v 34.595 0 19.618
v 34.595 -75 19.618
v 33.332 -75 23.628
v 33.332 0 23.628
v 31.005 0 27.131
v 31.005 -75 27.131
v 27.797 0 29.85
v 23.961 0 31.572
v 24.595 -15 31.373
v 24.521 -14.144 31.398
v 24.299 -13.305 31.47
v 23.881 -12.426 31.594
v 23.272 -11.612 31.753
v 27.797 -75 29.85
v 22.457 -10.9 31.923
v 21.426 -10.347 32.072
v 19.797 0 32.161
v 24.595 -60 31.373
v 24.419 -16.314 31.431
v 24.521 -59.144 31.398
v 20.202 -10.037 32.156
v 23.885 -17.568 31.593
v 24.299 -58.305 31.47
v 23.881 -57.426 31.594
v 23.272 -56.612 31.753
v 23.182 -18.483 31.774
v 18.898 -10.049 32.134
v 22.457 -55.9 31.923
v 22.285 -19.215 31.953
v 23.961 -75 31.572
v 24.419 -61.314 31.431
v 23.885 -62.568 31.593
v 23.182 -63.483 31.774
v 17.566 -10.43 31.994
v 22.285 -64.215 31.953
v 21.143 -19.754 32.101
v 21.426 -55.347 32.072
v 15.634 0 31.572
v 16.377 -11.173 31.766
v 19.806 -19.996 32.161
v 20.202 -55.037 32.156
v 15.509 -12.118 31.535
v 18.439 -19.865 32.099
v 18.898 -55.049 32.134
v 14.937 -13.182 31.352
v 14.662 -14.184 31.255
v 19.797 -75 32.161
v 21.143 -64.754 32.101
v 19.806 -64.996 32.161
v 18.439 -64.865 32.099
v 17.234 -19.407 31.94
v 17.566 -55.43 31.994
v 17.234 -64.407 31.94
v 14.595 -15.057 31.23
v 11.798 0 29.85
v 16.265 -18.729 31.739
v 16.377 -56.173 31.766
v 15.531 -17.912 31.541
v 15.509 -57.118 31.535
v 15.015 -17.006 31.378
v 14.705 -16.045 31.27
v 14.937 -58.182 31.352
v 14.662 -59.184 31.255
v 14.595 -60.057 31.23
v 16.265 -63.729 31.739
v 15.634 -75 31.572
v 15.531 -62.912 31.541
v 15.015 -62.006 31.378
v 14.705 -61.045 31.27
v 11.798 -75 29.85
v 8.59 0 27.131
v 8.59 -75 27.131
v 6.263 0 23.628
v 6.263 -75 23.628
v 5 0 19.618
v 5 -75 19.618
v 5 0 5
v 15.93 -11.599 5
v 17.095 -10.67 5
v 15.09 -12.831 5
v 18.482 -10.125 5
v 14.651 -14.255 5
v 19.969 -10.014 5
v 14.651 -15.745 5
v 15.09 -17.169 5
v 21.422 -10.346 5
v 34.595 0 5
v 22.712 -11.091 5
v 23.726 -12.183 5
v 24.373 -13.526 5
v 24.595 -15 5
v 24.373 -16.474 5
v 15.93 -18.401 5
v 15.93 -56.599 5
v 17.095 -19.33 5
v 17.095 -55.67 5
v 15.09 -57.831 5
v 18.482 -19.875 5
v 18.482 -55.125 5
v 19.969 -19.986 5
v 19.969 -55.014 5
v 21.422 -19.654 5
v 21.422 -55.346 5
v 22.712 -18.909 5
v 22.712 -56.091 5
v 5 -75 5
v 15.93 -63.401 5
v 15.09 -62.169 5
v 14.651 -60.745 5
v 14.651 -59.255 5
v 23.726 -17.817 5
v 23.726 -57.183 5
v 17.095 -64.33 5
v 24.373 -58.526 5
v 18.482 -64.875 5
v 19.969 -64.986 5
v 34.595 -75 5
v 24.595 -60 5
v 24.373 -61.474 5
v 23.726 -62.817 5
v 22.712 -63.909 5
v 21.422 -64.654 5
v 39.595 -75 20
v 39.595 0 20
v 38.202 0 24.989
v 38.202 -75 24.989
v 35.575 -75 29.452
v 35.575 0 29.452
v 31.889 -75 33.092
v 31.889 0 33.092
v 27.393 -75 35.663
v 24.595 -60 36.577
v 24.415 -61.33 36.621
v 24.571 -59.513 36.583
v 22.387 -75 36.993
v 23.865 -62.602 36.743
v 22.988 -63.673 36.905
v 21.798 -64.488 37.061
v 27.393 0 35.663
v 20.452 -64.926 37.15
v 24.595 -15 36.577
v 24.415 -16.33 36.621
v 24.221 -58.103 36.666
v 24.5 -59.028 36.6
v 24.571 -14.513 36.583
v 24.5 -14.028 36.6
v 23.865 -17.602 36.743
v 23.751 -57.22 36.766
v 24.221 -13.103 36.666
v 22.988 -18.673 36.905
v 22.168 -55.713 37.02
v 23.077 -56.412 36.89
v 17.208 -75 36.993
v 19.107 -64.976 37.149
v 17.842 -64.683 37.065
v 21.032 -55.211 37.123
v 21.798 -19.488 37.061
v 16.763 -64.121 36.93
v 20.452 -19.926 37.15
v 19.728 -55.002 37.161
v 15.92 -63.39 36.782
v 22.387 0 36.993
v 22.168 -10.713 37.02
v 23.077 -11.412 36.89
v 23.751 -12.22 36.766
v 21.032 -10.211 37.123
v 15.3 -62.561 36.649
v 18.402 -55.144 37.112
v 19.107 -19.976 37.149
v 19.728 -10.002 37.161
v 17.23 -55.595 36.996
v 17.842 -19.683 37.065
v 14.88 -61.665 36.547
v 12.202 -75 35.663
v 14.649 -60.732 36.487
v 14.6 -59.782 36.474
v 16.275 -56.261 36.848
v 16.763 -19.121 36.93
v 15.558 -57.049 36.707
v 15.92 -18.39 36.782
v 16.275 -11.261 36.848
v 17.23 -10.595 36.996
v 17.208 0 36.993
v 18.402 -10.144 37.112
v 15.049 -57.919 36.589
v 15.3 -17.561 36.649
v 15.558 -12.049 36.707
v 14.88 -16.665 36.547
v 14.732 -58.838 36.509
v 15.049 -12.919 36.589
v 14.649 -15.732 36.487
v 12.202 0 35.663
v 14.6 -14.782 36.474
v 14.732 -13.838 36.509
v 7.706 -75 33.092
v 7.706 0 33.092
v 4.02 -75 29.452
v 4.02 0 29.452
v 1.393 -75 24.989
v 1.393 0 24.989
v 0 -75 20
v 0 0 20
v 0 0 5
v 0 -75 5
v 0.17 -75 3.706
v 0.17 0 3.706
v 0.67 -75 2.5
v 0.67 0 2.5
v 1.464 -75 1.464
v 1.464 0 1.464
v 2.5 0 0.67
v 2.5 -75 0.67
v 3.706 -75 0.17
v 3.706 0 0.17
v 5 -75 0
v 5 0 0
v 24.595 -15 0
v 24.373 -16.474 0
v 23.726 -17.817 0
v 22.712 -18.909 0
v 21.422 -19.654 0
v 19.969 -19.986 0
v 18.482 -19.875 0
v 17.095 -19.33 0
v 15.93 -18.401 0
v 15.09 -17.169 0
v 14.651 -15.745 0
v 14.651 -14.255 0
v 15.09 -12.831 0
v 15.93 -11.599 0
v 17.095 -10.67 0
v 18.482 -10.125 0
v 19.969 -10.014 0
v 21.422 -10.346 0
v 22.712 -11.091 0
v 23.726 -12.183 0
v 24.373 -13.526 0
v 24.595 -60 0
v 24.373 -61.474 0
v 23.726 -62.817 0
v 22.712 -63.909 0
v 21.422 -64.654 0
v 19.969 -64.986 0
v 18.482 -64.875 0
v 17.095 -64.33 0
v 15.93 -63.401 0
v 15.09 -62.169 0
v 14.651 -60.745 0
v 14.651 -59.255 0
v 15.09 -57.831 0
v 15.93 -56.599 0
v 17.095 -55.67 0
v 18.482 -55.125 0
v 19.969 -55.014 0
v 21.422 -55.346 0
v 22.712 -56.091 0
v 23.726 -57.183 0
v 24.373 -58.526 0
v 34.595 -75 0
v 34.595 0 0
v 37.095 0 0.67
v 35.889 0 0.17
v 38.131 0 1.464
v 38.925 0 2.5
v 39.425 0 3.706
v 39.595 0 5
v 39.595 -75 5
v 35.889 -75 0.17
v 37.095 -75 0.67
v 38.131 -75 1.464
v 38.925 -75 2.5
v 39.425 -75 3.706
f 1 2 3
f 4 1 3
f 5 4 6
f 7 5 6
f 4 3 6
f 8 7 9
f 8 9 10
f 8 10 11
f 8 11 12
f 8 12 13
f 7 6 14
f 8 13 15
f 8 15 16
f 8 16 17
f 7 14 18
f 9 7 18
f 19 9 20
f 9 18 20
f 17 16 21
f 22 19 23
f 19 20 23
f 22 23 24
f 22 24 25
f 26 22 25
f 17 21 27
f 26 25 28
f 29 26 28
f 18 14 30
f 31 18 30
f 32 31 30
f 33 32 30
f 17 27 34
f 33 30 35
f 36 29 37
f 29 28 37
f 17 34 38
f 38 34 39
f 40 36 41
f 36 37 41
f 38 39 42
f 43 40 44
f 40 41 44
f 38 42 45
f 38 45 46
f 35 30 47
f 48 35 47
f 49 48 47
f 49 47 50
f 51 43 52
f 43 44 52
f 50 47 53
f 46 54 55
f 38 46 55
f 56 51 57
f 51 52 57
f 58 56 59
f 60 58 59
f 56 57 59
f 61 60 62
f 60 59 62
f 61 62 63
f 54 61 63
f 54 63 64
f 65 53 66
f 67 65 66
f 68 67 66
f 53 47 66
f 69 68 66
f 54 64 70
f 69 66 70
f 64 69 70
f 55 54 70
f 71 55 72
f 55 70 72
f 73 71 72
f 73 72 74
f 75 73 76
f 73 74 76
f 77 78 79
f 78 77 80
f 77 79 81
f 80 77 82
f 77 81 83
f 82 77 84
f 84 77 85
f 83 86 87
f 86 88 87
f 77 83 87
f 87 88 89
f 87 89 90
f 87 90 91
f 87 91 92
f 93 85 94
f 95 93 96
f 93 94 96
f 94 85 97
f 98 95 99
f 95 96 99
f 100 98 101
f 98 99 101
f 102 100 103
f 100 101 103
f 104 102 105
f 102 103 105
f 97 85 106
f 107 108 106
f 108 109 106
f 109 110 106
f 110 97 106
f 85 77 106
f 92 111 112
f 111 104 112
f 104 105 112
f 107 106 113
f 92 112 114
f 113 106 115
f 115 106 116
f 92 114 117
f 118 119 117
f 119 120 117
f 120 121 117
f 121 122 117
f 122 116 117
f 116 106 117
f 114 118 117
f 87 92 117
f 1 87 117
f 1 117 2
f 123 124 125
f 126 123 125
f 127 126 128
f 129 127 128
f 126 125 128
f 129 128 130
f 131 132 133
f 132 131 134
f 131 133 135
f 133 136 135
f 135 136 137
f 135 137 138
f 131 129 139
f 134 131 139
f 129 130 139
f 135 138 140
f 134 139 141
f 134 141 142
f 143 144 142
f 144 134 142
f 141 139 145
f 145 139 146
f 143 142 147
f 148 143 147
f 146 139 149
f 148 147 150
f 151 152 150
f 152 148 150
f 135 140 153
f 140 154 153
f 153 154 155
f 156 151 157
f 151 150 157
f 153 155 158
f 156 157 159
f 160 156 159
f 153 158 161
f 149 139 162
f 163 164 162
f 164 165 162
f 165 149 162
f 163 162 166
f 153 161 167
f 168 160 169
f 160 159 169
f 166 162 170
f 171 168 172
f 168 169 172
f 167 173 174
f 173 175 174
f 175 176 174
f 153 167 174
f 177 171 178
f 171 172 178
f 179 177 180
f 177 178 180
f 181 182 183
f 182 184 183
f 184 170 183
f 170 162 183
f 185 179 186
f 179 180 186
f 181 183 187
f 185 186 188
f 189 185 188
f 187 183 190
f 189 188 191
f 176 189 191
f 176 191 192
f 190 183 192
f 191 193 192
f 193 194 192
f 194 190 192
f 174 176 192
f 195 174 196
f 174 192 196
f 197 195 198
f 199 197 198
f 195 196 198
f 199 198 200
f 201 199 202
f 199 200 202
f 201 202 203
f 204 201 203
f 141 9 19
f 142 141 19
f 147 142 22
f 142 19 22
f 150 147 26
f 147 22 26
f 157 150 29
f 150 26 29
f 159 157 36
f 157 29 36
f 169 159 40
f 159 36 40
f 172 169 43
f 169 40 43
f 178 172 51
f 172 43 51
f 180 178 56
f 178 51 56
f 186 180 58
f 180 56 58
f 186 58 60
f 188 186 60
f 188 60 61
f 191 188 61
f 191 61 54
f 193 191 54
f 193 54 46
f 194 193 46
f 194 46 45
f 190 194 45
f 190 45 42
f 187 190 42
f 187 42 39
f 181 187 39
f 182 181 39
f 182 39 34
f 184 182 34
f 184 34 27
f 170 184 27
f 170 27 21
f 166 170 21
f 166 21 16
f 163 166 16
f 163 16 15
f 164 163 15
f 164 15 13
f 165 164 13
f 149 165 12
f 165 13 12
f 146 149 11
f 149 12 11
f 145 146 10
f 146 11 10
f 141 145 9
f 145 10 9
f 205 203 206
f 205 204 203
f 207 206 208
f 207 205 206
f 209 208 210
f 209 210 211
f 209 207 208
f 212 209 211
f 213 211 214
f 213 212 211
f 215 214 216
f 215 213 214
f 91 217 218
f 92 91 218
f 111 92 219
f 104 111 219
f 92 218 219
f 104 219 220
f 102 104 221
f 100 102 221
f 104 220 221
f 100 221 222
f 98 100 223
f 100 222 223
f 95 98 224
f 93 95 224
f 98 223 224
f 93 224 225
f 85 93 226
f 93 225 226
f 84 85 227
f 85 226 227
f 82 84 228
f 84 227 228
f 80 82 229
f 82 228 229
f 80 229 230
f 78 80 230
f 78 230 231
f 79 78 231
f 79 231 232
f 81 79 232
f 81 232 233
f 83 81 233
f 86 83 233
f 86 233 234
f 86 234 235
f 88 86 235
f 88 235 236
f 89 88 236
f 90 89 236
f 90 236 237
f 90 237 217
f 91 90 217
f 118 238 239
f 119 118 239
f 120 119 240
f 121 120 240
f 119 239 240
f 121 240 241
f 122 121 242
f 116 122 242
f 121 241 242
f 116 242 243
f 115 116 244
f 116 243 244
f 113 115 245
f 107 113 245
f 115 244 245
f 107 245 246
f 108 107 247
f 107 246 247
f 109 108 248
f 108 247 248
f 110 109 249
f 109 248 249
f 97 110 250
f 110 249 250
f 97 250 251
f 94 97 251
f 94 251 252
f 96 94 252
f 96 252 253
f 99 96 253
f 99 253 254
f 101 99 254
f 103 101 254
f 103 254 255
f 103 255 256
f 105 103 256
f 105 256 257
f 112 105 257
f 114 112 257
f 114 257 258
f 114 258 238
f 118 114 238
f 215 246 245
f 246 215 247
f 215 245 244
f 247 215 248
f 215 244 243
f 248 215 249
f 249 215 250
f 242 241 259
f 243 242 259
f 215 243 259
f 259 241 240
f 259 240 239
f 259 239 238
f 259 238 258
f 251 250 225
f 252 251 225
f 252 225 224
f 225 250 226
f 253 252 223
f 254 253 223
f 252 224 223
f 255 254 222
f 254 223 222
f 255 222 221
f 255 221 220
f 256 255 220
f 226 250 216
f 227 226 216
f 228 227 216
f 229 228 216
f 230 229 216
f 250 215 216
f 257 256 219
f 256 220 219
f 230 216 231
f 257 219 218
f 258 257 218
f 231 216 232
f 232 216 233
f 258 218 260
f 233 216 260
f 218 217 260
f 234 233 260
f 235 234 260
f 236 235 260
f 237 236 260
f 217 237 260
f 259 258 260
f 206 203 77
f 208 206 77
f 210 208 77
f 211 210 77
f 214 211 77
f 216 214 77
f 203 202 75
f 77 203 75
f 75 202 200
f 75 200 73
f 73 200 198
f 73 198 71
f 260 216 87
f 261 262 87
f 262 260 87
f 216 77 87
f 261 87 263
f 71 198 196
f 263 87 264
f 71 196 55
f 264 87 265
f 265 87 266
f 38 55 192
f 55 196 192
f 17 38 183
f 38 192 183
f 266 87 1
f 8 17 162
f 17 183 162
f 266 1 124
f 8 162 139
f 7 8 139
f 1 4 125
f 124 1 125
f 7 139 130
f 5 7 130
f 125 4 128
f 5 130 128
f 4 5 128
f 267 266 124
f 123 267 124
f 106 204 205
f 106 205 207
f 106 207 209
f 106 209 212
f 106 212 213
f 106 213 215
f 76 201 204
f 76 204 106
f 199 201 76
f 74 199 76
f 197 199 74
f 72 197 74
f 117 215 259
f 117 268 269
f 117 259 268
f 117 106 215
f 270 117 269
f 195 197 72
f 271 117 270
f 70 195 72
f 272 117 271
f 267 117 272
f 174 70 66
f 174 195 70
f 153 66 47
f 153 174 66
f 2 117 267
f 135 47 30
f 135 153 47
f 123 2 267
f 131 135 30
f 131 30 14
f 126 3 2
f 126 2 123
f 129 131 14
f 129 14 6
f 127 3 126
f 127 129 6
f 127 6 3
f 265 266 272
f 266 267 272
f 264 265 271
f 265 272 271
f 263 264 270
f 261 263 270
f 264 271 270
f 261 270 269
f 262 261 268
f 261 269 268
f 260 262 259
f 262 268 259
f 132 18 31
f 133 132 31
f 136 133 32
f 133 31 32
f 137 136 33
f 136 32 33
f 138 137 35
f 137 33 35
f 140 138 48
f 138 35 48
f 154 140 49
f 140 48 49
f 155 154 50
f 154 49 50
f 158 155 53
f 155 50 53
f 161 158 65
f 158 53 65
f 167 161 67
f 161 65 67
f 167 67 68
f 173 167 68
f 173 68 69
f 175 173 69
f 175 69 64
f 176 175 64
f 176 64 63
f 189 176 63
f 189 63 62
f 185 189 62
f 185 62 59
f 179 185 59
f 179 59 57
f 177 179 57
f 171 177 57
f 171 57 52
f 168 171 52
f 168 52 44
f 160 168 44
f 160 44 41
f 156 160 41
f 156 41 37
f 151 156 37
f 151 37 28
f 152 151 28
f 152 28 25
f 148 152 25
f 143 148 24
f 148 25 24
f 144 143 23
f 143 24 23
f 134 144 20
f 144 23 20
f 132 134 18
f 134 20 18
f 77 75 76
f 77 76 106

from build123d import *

# Parameters (mm, degrees)
F1_DEPTH = 75
F3_DEPTH = 75.001
F4_R     = 5
F5_DEPTH = 37.1620739384
F6_R     = 5


# Not quite as in the source:
# - a feature of the source that left no trace in its solid (it failed there, or was rolled back) is left out


with BuildPart() as f1:
    # F0 (on Front) → F1 (new body)
    with BuildSketch(Plane.XZ):
        with BuildLine():
            ThreePointArc((39.5949743688, 20), (19.7974871844, 37.1610739384), (0, 20))
            Line((0, 20), (0, 0))
            Line((0, 0), (39.5949743688, 0))
            Line((39.5949743688, 0), (39.5949743688, 20))
        make_face()
    extrude(amount=F1_DEPTH)

    # F2 (on face) → F3 (cut, through all)
    with BuildSketch(Plane.XZ.offset(75)):
        with BuildLine():
            Line((34.5949743688, 5), (34.5949743688, 19.6175700258))
            ThreePointArc((34.5949743688, 19.6175700258), (19.7974871844, 32.1610739384), (5, 19.6175700258))
            Line((5, 19.6175700258), (5, 5))
            Line((5, 5), (34.5949743688, 5))
        make_face()
    extrude(amount=-F3_DEPTH, mode=Mode.SUBTRACT)

    # F4 (on face) → F5 (cut, through all)
    with BuildSketch(Plane(origin=(0, 0, 0), x_dir=(1, 0, 0), z_dir=(0, 0, -1))):
        with Locations((19.5949743688, 60)):
            Circle(F4_R)
        with Locations((19.5949743688, 15)):
            Circle(F4_R)
    extrude(amount=-F5_DEPTH, mode=Mode.SUBTRACT)

    # F6
    f6_edges = [f1.edges().sort_by_distance(p)[0] for p in [
        (39.594974, -37.5, 0),
        (0, -37.5, 0),
    ]]
    fillet(f6_edges, radius=F6_R)


solid = f1.part
